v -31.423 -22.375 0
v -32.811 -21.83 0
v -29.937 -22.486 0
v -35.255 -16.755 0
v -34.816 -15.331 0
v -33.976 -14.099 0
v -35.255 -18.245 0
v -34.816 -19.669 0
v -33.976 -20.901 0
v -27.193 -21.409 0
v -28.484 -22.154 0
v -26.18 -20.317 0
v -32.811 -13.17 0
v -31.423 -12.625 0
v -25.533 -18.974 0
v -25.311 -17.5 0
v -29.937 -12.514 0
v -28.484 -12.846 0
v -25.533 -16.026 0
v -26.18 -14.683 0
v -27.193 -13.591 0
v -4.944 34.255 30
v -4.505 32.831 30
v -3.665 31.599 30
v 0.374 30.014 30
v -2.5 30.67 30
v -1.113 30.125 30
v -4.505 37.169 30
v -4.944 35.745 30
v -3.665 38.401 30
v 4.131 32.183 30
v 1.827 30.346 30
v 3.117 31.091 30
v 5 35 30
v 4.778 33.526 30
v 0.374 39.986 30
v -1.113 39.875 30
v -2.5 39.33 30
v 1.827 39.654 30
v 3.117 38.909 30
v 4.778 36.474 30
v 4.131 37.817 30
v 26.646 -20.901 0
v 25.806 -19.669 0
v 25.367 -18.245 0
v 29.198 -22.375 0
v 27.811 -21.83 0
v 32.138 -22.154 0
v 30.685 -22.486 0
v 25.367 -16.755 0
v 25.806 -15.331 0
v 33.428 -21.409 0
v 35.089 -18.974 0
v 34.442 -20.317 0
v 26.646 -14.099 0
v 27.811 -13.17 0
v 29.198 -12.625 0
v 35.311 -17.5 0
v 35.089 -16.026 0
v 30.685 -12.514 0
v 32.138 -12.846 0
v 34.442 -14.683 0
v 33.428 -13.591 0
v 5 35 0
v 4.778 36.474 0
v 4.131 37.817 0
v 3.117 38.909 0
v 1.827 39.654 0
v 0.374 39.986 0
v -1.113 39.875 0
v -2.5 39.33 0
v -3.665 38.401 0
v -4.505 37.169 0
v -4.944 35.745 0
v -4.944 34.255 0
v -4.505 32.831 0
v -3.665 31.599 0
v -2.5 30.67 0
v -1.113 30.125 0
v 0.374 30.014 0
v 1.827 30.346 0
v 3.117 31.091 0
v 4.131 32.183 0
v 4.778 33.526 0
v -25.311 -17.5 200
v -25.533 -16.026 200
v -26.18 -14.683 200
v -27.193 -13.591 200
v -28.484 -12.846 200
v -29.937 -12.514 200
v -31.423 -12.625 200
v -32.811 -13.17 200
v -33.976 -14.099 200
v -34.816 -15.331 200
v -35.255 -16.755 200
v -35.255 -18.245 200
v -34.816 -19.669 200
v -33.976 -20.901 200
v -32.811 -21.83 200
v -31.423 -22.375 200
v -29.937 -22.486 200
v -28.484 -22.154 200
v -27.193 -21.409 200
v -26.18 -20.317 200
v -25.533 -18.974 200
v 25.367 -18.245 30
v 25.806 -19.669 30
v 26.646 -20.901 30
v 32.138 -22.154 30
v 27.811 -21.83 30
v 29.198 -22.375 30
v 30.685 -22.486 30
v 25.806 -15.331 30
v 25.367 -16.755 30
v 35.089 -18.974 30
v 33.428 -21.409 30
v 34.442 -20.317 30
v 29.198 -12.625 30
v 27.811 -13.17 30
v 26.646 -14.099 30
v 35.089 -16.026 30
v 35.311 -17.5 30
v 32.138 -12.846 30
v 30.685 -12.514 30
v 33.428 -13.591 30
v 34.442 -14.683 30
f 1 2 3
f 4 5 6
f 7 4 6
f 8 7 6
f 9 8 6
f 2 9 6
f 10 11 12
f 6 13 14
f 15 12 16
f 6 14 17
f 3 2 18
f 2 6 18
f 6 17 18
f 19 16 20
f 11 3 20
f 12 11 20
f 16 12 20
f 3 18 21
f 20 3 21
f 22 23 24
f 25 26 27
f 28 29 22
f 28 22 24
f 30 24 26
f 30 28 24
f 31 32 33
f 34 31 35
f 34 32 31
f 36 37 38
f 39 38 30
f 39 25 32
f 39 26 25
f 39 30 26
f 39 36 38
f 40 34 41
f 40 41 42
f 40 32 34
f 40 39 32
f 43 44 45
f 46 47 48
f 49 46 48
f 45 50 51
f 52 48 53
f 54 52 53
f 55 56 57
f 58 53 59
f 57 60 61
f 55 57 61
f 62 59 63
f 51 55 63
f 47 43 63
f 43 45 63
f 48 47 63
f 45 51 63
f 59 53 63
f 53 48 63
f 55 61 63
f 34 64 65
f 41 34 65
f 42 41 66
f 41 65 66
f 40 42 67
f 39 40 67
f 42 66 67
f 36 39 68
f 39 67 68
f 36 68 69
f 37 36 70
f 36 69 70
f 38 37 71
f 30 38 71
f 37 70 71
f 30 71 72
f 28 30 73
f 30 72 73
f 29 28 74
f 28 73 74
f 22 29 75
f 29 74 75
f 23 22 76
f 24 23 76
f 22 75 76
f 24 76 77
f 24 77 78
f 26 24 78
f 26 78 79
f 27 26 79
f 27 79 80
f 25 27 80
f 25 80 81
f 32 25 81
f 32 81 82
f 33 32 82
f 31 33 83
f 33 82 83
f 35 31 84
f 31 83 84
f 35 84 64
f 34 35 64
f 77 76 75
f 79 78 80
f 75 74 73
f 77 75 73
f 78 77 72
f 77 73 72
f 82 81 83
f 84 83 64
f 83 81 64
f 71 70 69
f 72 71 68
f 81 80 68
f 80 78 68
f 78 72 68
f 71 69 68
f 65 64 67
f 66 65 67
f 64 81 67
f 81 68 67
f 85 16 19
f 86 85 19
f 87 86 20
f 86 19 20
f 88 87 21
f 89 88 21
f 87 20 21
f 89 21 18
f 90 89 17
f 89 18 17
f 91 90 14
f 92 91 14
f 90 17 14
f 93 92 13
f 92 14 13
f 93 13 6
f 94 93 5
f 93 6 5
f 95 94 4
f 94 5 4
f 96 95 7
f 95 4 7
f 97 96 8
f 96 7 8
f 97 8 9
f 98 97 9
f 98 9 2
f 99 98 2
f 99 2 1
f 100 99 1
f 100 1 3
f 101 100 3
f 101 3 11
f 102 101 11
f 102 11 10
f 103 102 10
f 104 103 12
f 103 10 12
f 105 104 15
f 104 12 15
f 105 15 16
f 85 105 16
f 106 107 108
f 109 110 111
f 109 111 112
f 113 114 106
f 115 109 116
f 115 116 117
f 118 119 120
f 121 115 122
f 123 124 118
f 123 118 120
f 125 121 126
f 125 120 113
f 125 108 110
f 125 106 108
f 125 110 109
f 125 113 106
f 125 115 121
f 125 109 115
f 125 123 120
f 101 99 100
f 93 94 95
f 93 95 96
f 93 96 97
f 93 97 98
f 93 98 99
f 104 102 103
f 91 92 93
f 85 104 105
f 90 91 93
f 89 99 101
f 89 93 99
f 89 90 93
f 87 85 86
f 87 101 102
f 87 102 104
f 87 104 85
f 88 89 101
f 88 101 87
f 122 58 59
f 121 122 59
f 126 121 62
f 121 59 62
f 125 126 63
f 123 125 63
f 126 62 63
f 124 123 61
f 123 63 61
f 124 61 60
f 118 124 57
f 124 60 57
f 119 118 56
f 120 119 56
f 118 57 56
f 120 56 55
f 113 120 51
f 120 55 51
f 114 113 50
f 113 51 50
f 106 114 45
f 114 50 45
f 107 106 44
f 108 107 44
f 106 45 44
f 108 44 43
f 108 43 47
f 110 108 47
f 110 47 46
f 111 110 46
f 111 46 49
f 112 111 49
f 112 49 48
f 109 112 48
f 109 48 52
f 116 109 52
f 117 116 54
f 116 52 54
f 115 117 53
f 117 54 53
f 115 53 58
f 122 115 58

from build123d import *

# Parameters (mm, degrees)
F1_R     = 5
F2_DEPTH = 30
F3_DEPTH = 200
F4_DEPTH = 30


with BuildPart() as f2:
    # F1 (on Top) → F2 (new body)
    with BuildSketch(Plane.XY):
        with Locations((0, 35)):
            Circle(F1_R)
    extrude(amount=F2_DEPTH)


with BuildPart() as f3:
    # F1 (on Top) → F3 (new body)
    with BuildSketch(Plane.XY):
        with Locations((-30.310889, -17.5)):
            Circle(F1_R)
    extrude(amount=F3_DEPTH)


with BuildPart() as f4:
    # F1 (on Top) → F4 (new body)
    with BuildSketch(Plane.XY):
        with Locations((30.310889, -17.5)):
            Circle(F1_R)
    extrude(amount=F4_DEPTH)


solid = Compound([f2.part, f3.part, f4.part])
